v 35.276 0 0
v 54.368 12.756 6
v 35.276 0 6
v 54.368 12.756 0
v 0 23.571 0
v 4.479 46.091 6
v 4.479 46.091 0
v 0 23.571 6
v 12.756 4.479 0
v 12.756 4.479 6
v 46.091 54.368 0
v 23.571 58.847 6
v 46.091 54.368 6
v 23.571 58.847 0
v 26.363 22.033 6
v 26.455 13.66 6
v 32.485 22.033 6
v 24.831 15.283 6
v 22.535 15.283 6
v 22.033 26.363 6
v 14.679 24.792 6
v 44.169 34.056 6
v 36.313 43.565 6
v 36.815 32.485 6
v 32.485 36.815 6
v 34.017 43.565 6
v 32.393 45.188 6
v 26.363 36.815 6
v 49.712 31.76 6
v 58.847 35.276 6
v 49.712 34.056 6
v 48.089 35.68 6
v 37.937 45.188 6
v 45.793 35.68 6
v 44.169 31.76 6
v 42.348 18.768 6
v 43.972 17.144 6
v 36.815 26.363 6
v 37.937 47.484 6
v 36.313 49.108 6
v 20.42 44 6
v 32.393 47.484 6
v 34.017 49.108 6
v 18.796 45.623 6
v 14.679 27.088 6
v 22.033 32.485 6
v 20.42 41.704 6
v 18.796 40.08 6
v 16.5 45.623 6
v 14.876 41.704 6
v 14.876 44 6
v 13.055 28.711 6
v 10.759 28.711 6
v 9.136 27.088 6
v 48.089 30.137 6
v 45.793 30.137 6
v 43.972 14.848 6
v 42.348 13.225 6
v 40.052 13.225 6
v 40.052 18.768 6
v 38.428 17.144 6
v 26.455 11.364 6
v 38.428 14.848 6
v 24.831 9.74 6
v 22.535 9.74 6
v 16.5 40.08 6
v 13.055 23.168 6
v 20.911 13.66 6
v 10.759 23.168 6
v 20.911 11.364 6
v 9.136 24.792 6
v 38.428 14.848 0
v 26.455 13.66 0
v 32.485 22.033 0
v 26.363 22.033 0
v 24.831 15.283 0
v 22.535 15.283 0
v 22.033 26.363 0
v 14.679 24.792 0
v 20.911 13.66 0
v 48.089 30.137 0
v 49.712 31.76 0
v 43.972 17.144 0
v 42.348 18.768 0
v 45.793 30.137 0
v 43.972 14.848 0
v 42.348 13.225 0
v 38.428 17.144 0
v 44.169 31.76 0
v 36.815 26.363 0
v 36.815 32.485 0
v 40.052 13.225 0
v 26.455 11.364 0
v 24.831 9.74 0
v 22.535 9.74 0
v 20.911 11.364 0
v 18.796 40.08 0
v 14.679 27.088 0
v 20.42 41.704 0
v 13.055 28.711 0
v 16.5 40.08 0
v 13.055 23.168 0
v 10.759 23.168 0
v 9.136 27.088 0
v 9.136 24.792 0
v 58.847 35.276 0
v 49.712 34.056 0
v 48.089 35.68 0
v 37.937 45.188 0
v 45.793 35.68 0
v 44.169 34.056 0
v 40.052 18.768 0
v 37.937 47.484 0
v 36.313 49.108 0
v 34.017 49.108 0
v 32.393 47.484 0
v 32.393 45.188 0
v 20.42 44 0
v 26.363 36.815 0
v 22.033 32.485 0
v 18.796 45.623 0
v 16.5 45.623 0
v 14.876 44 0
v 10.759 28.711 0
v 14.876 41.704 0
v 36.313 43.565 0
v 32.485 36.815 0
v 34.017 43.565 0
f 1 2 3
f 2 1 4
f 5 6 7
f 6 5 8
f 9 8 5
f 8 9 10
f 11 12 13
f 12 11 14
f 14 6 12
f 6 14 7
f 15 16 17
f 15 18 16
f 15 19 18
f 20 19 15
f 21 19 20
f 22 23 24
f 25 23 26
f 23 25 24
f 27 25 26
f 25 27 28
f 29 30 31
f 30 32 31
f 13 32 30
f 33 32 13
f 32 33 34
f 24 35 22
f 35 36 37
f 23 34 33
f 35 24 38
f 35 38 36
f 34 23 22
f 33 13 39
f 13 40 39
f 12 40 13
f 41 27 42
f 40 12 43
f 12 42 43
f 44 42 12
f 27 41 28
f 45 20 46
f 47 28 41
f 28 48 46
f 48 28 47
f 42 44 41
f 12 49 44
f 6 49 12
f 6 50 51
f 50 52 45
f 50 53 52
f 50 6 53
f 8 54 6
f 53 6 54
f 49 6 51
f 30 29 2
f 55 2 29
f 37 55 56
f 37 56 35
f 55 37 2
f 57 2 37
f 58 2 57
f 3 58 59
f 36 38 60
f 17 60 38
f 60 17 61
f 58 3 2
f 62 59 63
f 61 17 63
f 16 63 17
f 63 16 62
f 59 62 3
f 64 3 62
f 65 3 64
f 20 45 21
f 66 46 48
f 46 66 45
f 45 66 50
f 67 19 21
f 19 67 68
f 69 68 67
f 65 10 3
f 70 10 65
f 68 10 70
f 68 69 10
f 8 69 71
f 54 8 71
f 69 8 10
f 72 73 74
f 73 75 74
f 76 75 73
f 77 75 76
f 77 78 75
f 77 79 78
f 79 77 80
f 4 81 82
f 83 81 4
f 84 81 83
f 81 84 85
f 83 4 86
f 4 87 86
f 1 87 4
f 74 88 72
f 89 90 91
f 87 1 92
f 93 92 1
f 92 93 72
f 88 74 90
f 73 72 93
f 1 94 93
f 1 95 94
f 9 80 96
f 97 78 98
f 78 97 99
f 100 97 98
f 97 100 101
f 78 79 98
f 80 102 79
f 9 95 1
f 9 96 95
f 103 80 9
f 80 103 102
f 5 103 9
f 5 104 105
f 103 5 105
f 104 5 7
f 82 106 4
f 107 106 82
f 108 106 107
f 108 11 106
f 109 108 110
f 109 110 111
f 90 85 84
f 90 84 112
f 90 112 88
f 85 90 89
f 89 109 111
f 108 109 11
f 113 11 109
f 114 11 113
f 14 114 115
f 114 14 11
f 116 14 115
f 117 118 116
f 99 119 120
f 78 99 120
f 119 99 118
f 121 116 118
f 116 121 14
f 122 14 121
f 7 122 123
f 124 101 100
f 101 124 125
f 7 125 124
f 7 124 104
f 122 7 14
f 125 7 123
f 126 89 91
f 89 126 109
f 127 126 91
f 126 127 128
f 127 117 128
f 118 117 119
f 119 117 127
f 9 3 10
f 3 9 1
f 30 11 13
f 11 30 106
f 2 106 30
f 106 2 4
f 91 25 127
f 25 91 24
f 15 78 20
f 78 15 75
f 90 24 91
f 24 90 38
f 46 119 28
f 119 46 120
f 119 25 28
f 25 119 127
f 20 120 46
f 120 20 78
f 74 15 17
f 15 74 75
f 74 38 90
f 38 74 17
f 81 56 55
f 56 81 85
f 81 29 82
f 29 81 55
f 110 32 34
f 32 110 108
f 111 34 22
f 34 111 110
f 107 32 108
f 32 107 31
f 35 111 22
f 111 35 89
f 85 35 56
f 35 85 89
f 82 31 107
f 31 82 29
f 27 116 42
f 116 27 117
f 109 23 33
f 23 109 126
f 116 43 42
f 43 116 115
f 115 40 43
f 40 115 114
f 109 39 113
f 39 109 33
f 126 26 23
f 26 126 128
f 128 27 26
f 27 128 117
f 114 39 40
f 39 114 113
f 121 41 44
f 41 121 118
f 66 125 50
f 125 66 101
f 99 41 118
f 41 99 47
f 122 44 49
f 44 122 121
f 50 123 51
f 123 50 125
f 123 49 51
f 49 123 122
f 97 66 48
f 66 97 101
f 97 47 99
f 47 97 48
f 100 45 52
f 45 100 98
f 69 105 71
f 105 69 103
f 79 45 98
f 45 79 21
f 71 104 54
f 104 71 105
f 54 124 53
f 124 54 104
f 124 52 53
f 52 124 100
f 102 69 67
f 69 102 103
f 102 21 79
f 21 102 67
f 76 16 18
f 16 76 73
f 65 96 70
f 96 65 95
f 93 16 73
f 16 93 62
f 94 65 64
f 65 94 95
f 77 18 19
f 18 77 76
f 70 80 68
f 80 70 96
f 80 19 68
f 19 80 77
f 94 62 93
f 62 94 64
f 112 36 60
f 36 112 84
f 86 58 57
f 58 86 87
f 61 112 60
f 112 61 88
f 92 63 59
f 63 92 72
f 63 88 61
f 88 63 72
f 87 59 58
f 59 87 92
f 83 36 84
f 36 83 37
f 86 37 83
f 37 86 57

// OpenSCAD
$fn = 32;

// ----------------------------------------------------------------------
// Polygon plate: 8-gon R30, 6 bolt windows
// ----------------------------------------------------------------------

// --- parameters (mm) ---
sides = 8;                // number of polygon sides
plate_r = 30;             // circumscribed radius of the polygon
bore_r = 8;               // centre bore radius
bolts = 6;                // number of bolt windows
ring_r = 17.86;           // bolt-circle radius
bolt_r = 3;               // bolt window radius
plate_t = 6;              // plate thickness, Z (extrusion height)
fit_tol = 0.02;           // declared fit tolerance (prompt contract)
free_tol = 0.2;           // declared free tolerance (prompt contract)

plate_d = 2 * plate_r;  // circumscribed diameter
bore_d = 2 * bore_r;  // centre bore diameter
bolt_d = 2 * bolt_r;  // bolt window diameter
ring_d = 2 * ring_r;  // bolt-circle diameter

profile = [[58.847, 35.276], [46.091, 54.368], [23.571, 58.847], [4.479, 46.091], [0, 23.571], [12.756, 4.479], [35.276, 0], [54.368, 12.756]];  // primary outline, 8 points, counter clockwise
void_1 = [[36.815, 32.485], [32.485, 36.815], [26.363, 36.815], [22.033, 32.485], [22.033, 26.363], [26.363, 22.033], [32.485, 22.033], [36.815, 26.363]];  // centre bore, 8 points
void_2 = [[49.712, 34.056], [48.089, 35.68], [45.793, 35.68], [44.169, 34.056], [44.169, 31.76], [45.793, 30.137], [48.089, 30.137], [49.712, 31.76]];  // bolt window 1, 8 points
void_3 = [[37.937, 47.484], [36.313, 49.108], [34.017, 49.108], [32.393, 47.484], [32.393, 45.188], [34.017, 43.565], [36.313, 43.565], [37.937, 45.188]];  // bolt window 2, 8 points
void_4 = [[20.42, 44], [18.796, 45.623], [16.5, 45.623], [14.876, 44], [14.876, 41.704], [16.5, 40.08], [18.796, 40.08], [20.42, 41.704]];  // bolt window 3, 8 points
void_5 = [[14.679, 27.088], [13.055, 28.711], [10.759, 28.711], [9.136, 27.088], [9.136, 24.792], [10.759, 23.168], [13.055, 23.168], [14.679, 24.792]];  // bolt window 4, 8 points
void_6 = [[26.455, 13.66], [24.831, 15.283], [22.535, 15.283], [20.911, 13.66], [20.911, 11.364], [22.535, 9.74], [24.831, 9.74], [26.455, 11.364]];  // bolt window 5, 8 points
void_7 = [[43.972, 17.144], [42.348, 18.768], [40.052, 18.768], [38.428, 17.144], [38.428, 14.848], [40.052, 13.225], [42.348, 13.225], [43.972, 14.848]];  // bolt window 6, 8 points

// --- the one profile operation ---
difference() {
  linear_extrude(height = plate_t) polygon(points = profile);
  translate([0, 0, -1])
    linear_extrude(height = plate_t + 2) polygon(points = void_1);
  translate([0, 0, -1])
    linear_extrude(height = plate_t + 2) polygon(points = void_2);
  translate([0, 0, -1])
    linear_extrude(height = plate_t + 2) polygon(points = void_3);
  translate([0, 0, -1])
    linear_extrude(height = plate_t + 2) polygon(points = void_4);
  translate([0, 0, -1])
    linear_extrude(height = plate_t + 2) polygon(points = void_5);
  translate([0, 0, -1])
    linear_extrude(height = plate_t + 2) polygon(points = void_6);
  translate([0, 0, -1])
    linear_extrude(height = plate_t + 2) polygon(points = void_7);
}
